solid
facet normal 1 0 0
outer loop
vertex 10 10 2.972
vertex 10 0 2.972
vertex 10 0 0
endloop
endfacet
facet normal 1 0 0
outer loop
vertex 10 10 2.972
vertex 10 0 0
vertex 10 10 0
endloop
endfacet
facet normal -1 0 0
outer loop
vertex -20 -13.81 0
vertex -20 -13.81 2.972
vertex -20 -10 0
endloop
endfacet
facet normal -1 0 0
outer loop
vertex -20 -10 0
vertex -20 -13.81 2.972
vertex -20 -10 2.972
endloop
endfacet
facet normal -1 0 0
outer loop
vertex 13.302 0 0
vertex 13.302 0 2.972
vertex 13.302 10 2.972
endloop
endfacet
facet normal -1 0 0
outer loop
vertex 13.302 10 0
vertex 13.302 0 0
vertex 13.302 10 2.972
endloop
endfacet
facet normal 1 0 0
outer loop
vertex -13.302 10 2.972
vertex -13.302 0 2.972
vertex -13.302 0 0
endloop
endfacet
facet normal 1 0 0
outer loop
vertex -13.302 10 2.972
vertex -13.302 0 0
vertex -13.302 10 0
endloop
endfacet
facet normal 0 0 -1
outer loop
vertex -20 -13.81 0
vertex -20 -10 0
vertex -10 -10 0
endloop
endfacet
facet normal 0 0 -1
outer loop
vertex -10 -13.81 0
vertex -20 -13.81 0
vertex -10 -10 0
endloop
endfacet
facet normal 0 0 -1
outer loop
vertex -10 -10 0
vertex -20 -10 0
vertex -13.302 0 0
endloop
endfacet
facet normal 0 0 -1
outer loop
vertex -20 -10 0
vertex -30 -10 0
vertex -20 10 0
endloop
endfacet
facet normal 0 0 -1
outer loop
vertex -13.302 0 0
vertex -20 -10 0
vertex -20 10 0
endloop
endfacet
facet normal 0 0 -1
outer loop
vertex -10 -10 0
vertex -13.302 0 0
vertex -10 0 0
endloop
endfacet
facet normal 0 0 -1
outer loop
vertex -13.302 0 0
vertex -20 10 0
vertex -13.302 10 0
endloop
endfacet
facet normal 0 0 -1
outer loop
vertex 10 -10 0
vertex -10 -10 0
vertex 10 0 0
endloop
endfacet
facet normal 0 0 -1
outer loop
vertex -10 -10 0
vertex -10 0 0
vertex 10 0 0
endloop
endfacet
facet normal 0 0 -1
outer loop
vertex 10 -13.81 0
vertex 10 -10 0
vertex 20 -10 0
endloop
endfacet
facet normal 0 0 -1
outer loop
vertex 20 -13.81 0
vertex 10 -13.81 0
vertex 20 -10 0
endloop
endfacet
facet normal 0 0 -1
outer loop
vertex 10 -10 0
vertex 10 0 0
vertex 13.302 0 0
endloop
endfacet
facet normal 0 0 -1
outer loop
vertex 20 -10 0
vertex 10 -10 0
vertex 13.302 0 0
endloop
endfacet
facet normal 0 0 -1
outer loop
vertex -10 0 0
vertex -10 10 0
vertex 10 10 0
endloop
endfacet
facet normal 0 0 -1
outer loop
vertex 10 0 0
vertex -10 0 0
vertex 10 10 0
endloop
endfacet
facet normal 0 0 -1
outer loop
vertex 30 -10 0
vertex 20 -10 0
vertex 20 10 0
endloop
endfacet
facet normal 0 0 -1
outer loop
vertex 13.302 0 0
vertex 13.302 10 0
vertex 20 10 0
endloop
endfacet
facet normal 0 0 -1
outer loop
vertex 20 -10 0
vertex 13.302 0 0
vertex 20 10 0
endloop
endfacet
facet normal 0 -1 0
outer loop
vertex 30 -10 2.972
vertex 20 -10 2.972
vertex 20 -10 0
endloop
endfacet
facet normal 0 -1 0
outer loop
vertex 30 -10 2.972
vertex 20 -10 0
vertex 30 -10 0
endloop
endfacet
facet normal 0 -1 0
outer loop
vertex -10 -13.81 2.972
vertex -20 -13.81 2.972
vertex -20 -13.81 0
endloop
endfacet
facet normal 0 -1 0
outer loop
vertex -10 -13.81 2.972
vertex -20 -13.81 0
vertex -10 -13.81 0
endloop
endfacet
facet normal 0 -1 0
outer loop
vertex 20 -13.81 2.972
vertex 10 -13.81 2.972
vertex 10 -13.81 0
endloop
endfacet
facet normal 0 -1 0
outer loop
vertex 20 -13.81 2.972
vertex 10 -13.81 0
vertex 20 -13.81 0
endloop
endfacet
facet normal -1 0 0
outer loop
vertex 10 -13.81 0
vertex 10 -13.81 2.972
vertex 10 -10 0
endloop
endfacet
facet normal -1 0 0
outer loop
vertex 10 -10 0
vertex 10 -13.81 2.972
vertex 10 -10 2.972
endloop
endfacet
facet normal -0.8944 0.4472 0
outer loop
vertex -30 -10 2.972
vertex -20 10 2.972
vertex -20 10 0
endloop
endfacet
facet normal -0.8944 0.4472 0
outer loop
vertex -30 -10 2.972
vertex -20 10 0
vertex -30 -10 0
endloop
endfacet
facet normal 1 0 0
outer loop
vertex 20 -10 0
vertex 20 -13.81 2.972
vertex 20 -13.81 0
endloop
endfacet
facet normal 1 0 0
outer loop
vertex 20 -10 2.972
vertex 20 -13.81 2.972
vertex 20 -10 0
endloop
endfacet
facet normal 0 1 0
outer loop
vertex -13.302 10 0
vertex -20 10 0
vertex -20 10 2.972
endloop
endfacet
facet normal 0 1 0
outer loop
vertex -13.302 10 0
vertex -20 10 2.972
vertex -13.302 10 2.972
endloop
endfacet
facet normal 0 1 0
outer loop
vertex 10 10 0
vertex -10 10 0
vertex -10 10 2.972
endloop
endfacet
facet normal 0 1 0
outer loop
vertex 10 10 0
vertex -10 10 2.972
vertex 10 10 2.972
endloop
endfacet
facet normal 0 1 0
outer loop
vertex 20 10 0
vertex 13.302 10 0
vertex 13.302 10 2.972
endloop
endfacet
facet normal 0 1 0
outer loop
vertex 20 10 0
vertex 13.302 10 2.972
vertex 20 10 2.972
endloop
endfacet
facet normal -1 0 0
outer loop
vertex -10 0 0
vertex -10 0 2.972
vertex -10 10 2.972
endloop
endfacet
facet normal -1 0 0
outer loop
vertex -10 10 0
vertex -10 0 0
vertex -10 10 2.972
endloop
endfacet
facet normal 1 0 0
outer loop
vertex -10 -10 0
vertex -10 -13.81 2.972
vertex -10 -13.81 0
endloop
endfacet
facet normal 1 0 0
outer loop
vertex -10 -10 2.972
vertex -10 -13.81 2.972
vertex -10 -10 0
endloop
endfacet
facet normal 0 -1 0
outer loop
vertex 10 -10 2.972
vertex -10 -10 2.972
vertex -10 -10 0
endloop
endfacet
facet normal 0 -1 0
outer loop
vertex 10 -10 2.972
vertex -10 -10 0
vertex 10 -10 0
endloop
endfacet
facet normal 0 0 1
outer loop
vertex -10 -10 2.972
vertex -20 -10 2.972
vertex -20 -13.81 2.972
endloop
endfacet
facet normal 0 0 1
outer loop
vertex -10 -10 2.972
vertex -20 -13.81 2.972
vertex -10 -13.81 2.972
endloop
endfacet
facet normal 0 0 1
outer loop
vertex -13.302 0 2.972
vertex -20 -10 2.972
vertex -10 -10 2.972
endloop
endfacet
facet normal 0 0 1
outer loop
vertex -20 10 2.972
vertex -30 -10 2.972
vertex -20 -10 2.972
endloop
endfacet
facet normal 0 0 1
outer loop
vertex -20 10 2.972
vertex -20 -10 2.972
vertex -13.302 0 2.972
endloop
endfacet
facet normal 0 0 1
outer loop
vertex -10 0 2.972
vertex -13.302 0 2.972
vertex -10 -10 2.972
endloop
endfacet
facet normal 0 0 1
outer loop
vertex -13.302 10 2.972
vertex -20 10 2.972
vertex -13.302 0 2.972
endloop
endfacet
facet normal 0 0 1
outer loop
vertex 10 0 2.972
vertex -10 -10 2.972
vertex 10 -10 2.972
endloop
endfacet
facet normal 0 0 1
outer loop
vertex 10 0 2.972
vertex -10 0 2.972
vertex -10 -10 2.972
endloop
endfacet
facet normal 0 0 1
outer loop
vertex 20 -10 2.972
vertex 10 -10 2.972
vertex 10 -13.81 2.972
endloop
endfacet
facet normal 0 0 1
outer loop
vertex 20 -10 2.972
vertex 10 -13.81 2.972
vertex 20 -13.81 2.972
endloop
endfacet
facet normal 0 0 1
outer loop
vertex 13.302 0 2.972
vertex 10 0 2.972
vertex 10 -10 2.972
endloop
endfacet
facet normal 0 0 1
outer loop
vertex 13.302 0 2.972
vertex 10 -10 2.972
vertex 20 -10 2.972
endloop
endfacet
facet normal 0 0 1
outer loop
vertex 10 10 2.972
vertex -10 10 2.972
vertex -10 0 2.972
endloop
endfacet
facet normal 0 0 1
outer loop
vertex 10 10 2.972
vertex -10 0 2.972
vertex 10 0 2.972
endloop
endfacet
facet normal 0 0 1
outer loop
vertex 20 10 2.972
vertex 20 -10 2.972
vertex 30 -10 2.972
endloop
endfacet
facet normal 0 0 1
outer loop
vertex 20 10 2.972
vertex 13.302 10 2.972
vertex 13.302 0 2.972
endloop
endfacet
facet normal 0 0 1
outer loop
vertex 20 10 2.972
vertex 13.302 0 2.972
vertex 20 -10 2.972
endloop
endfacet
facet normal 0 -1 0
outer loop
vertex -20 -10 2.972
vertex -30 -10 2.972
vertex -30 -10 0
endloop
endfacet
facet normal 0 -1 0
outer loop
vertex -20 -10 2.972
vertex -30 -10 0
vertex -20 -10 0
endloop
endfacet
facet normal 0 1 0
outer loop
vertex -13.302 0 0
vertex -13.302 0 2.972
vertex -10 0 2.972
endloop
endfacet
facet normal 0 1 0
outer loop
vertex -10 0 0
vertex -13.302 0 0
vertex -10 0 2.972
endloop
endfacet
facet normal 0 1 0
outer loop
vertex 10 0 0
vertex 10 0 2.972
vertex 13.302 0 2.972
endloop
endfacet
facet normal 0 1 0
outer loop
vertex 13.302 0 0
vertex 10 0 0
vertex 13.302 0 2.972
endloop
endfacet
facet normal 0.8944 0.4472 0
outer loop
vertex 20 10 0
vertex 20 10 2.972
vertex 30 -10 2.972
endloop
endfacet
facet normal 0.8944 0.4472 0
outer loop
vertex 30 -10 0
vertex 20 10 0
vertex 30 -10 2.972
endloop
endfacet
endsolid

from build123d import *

# Parameters (mm, degrees)
SKETCH1_W           = 40
SKETCH1_H           = 20
BOSS_EXTRUDE1_DEPTH = 2.9718
BOSS_EXTRUDE2_DEPTH = 2.9718
SKETCH3_W           = 3.302
SKETCH3_H           = 20
CUT_EXTRUDE1_DEPTH  = 3.9718
SKETCH4_W           = 10
SKETCH4_H           = 3.81
BOSS_EXTRUDE3_DEPTH = 2.9718


with BuildPart() as part:
    # Sketch1 → Boss-Extrude1 (new body)
    with BuildSketch(Plane.XY):
        Rectangle(SKETCH1_W, SKETCH1_H)
    extrude(amount=BOSS_EXTRUDE1_DEPTH)

    # Sketch2 → Boss-Extrude2 (add)
    with BuildSketch(Plane.XY.offset(2.9718)):
        Polygon((-20, 10), (-30, -10), (-20, -10), align=None)
        Polygon((20, -10), (20, 10), (30, -10), align=None)
    extrude(amount=-BOSS_EXTRUDE2_DEPTH)

    # Sketch3 → Cut-Extrude1 (cut, through all)
    with BuildSketch(Plane.XY.offset(2.9718)):
        with Locations((-11.651, 10)):
            Rectangle(SKETCH3_W, SKETCH3_H)
        with Locations((11.651, 10)):
            Rectangle(SKETCH3_W, SKETCH3_H)
    extrude(amount=-CUT_EXTRUDE1_DEPTH, mode=Mode.SUBTRACT)

    # Sketch4 → Boss-Extrude3 (add)
    with BuildSketch(Plane.XY.offset(2.9718)):
        with Locations((-15, -11.905)):
            Rectangle(SKETCH4_W, SKETCH4_H)
        with Locations((15, -11.905)):
            Rectangle(SKETCH4_W, SKETCH4_H)
    extrude(amount=-BOSS_EXTRUDE3_DEPTH)


solid = part.part
